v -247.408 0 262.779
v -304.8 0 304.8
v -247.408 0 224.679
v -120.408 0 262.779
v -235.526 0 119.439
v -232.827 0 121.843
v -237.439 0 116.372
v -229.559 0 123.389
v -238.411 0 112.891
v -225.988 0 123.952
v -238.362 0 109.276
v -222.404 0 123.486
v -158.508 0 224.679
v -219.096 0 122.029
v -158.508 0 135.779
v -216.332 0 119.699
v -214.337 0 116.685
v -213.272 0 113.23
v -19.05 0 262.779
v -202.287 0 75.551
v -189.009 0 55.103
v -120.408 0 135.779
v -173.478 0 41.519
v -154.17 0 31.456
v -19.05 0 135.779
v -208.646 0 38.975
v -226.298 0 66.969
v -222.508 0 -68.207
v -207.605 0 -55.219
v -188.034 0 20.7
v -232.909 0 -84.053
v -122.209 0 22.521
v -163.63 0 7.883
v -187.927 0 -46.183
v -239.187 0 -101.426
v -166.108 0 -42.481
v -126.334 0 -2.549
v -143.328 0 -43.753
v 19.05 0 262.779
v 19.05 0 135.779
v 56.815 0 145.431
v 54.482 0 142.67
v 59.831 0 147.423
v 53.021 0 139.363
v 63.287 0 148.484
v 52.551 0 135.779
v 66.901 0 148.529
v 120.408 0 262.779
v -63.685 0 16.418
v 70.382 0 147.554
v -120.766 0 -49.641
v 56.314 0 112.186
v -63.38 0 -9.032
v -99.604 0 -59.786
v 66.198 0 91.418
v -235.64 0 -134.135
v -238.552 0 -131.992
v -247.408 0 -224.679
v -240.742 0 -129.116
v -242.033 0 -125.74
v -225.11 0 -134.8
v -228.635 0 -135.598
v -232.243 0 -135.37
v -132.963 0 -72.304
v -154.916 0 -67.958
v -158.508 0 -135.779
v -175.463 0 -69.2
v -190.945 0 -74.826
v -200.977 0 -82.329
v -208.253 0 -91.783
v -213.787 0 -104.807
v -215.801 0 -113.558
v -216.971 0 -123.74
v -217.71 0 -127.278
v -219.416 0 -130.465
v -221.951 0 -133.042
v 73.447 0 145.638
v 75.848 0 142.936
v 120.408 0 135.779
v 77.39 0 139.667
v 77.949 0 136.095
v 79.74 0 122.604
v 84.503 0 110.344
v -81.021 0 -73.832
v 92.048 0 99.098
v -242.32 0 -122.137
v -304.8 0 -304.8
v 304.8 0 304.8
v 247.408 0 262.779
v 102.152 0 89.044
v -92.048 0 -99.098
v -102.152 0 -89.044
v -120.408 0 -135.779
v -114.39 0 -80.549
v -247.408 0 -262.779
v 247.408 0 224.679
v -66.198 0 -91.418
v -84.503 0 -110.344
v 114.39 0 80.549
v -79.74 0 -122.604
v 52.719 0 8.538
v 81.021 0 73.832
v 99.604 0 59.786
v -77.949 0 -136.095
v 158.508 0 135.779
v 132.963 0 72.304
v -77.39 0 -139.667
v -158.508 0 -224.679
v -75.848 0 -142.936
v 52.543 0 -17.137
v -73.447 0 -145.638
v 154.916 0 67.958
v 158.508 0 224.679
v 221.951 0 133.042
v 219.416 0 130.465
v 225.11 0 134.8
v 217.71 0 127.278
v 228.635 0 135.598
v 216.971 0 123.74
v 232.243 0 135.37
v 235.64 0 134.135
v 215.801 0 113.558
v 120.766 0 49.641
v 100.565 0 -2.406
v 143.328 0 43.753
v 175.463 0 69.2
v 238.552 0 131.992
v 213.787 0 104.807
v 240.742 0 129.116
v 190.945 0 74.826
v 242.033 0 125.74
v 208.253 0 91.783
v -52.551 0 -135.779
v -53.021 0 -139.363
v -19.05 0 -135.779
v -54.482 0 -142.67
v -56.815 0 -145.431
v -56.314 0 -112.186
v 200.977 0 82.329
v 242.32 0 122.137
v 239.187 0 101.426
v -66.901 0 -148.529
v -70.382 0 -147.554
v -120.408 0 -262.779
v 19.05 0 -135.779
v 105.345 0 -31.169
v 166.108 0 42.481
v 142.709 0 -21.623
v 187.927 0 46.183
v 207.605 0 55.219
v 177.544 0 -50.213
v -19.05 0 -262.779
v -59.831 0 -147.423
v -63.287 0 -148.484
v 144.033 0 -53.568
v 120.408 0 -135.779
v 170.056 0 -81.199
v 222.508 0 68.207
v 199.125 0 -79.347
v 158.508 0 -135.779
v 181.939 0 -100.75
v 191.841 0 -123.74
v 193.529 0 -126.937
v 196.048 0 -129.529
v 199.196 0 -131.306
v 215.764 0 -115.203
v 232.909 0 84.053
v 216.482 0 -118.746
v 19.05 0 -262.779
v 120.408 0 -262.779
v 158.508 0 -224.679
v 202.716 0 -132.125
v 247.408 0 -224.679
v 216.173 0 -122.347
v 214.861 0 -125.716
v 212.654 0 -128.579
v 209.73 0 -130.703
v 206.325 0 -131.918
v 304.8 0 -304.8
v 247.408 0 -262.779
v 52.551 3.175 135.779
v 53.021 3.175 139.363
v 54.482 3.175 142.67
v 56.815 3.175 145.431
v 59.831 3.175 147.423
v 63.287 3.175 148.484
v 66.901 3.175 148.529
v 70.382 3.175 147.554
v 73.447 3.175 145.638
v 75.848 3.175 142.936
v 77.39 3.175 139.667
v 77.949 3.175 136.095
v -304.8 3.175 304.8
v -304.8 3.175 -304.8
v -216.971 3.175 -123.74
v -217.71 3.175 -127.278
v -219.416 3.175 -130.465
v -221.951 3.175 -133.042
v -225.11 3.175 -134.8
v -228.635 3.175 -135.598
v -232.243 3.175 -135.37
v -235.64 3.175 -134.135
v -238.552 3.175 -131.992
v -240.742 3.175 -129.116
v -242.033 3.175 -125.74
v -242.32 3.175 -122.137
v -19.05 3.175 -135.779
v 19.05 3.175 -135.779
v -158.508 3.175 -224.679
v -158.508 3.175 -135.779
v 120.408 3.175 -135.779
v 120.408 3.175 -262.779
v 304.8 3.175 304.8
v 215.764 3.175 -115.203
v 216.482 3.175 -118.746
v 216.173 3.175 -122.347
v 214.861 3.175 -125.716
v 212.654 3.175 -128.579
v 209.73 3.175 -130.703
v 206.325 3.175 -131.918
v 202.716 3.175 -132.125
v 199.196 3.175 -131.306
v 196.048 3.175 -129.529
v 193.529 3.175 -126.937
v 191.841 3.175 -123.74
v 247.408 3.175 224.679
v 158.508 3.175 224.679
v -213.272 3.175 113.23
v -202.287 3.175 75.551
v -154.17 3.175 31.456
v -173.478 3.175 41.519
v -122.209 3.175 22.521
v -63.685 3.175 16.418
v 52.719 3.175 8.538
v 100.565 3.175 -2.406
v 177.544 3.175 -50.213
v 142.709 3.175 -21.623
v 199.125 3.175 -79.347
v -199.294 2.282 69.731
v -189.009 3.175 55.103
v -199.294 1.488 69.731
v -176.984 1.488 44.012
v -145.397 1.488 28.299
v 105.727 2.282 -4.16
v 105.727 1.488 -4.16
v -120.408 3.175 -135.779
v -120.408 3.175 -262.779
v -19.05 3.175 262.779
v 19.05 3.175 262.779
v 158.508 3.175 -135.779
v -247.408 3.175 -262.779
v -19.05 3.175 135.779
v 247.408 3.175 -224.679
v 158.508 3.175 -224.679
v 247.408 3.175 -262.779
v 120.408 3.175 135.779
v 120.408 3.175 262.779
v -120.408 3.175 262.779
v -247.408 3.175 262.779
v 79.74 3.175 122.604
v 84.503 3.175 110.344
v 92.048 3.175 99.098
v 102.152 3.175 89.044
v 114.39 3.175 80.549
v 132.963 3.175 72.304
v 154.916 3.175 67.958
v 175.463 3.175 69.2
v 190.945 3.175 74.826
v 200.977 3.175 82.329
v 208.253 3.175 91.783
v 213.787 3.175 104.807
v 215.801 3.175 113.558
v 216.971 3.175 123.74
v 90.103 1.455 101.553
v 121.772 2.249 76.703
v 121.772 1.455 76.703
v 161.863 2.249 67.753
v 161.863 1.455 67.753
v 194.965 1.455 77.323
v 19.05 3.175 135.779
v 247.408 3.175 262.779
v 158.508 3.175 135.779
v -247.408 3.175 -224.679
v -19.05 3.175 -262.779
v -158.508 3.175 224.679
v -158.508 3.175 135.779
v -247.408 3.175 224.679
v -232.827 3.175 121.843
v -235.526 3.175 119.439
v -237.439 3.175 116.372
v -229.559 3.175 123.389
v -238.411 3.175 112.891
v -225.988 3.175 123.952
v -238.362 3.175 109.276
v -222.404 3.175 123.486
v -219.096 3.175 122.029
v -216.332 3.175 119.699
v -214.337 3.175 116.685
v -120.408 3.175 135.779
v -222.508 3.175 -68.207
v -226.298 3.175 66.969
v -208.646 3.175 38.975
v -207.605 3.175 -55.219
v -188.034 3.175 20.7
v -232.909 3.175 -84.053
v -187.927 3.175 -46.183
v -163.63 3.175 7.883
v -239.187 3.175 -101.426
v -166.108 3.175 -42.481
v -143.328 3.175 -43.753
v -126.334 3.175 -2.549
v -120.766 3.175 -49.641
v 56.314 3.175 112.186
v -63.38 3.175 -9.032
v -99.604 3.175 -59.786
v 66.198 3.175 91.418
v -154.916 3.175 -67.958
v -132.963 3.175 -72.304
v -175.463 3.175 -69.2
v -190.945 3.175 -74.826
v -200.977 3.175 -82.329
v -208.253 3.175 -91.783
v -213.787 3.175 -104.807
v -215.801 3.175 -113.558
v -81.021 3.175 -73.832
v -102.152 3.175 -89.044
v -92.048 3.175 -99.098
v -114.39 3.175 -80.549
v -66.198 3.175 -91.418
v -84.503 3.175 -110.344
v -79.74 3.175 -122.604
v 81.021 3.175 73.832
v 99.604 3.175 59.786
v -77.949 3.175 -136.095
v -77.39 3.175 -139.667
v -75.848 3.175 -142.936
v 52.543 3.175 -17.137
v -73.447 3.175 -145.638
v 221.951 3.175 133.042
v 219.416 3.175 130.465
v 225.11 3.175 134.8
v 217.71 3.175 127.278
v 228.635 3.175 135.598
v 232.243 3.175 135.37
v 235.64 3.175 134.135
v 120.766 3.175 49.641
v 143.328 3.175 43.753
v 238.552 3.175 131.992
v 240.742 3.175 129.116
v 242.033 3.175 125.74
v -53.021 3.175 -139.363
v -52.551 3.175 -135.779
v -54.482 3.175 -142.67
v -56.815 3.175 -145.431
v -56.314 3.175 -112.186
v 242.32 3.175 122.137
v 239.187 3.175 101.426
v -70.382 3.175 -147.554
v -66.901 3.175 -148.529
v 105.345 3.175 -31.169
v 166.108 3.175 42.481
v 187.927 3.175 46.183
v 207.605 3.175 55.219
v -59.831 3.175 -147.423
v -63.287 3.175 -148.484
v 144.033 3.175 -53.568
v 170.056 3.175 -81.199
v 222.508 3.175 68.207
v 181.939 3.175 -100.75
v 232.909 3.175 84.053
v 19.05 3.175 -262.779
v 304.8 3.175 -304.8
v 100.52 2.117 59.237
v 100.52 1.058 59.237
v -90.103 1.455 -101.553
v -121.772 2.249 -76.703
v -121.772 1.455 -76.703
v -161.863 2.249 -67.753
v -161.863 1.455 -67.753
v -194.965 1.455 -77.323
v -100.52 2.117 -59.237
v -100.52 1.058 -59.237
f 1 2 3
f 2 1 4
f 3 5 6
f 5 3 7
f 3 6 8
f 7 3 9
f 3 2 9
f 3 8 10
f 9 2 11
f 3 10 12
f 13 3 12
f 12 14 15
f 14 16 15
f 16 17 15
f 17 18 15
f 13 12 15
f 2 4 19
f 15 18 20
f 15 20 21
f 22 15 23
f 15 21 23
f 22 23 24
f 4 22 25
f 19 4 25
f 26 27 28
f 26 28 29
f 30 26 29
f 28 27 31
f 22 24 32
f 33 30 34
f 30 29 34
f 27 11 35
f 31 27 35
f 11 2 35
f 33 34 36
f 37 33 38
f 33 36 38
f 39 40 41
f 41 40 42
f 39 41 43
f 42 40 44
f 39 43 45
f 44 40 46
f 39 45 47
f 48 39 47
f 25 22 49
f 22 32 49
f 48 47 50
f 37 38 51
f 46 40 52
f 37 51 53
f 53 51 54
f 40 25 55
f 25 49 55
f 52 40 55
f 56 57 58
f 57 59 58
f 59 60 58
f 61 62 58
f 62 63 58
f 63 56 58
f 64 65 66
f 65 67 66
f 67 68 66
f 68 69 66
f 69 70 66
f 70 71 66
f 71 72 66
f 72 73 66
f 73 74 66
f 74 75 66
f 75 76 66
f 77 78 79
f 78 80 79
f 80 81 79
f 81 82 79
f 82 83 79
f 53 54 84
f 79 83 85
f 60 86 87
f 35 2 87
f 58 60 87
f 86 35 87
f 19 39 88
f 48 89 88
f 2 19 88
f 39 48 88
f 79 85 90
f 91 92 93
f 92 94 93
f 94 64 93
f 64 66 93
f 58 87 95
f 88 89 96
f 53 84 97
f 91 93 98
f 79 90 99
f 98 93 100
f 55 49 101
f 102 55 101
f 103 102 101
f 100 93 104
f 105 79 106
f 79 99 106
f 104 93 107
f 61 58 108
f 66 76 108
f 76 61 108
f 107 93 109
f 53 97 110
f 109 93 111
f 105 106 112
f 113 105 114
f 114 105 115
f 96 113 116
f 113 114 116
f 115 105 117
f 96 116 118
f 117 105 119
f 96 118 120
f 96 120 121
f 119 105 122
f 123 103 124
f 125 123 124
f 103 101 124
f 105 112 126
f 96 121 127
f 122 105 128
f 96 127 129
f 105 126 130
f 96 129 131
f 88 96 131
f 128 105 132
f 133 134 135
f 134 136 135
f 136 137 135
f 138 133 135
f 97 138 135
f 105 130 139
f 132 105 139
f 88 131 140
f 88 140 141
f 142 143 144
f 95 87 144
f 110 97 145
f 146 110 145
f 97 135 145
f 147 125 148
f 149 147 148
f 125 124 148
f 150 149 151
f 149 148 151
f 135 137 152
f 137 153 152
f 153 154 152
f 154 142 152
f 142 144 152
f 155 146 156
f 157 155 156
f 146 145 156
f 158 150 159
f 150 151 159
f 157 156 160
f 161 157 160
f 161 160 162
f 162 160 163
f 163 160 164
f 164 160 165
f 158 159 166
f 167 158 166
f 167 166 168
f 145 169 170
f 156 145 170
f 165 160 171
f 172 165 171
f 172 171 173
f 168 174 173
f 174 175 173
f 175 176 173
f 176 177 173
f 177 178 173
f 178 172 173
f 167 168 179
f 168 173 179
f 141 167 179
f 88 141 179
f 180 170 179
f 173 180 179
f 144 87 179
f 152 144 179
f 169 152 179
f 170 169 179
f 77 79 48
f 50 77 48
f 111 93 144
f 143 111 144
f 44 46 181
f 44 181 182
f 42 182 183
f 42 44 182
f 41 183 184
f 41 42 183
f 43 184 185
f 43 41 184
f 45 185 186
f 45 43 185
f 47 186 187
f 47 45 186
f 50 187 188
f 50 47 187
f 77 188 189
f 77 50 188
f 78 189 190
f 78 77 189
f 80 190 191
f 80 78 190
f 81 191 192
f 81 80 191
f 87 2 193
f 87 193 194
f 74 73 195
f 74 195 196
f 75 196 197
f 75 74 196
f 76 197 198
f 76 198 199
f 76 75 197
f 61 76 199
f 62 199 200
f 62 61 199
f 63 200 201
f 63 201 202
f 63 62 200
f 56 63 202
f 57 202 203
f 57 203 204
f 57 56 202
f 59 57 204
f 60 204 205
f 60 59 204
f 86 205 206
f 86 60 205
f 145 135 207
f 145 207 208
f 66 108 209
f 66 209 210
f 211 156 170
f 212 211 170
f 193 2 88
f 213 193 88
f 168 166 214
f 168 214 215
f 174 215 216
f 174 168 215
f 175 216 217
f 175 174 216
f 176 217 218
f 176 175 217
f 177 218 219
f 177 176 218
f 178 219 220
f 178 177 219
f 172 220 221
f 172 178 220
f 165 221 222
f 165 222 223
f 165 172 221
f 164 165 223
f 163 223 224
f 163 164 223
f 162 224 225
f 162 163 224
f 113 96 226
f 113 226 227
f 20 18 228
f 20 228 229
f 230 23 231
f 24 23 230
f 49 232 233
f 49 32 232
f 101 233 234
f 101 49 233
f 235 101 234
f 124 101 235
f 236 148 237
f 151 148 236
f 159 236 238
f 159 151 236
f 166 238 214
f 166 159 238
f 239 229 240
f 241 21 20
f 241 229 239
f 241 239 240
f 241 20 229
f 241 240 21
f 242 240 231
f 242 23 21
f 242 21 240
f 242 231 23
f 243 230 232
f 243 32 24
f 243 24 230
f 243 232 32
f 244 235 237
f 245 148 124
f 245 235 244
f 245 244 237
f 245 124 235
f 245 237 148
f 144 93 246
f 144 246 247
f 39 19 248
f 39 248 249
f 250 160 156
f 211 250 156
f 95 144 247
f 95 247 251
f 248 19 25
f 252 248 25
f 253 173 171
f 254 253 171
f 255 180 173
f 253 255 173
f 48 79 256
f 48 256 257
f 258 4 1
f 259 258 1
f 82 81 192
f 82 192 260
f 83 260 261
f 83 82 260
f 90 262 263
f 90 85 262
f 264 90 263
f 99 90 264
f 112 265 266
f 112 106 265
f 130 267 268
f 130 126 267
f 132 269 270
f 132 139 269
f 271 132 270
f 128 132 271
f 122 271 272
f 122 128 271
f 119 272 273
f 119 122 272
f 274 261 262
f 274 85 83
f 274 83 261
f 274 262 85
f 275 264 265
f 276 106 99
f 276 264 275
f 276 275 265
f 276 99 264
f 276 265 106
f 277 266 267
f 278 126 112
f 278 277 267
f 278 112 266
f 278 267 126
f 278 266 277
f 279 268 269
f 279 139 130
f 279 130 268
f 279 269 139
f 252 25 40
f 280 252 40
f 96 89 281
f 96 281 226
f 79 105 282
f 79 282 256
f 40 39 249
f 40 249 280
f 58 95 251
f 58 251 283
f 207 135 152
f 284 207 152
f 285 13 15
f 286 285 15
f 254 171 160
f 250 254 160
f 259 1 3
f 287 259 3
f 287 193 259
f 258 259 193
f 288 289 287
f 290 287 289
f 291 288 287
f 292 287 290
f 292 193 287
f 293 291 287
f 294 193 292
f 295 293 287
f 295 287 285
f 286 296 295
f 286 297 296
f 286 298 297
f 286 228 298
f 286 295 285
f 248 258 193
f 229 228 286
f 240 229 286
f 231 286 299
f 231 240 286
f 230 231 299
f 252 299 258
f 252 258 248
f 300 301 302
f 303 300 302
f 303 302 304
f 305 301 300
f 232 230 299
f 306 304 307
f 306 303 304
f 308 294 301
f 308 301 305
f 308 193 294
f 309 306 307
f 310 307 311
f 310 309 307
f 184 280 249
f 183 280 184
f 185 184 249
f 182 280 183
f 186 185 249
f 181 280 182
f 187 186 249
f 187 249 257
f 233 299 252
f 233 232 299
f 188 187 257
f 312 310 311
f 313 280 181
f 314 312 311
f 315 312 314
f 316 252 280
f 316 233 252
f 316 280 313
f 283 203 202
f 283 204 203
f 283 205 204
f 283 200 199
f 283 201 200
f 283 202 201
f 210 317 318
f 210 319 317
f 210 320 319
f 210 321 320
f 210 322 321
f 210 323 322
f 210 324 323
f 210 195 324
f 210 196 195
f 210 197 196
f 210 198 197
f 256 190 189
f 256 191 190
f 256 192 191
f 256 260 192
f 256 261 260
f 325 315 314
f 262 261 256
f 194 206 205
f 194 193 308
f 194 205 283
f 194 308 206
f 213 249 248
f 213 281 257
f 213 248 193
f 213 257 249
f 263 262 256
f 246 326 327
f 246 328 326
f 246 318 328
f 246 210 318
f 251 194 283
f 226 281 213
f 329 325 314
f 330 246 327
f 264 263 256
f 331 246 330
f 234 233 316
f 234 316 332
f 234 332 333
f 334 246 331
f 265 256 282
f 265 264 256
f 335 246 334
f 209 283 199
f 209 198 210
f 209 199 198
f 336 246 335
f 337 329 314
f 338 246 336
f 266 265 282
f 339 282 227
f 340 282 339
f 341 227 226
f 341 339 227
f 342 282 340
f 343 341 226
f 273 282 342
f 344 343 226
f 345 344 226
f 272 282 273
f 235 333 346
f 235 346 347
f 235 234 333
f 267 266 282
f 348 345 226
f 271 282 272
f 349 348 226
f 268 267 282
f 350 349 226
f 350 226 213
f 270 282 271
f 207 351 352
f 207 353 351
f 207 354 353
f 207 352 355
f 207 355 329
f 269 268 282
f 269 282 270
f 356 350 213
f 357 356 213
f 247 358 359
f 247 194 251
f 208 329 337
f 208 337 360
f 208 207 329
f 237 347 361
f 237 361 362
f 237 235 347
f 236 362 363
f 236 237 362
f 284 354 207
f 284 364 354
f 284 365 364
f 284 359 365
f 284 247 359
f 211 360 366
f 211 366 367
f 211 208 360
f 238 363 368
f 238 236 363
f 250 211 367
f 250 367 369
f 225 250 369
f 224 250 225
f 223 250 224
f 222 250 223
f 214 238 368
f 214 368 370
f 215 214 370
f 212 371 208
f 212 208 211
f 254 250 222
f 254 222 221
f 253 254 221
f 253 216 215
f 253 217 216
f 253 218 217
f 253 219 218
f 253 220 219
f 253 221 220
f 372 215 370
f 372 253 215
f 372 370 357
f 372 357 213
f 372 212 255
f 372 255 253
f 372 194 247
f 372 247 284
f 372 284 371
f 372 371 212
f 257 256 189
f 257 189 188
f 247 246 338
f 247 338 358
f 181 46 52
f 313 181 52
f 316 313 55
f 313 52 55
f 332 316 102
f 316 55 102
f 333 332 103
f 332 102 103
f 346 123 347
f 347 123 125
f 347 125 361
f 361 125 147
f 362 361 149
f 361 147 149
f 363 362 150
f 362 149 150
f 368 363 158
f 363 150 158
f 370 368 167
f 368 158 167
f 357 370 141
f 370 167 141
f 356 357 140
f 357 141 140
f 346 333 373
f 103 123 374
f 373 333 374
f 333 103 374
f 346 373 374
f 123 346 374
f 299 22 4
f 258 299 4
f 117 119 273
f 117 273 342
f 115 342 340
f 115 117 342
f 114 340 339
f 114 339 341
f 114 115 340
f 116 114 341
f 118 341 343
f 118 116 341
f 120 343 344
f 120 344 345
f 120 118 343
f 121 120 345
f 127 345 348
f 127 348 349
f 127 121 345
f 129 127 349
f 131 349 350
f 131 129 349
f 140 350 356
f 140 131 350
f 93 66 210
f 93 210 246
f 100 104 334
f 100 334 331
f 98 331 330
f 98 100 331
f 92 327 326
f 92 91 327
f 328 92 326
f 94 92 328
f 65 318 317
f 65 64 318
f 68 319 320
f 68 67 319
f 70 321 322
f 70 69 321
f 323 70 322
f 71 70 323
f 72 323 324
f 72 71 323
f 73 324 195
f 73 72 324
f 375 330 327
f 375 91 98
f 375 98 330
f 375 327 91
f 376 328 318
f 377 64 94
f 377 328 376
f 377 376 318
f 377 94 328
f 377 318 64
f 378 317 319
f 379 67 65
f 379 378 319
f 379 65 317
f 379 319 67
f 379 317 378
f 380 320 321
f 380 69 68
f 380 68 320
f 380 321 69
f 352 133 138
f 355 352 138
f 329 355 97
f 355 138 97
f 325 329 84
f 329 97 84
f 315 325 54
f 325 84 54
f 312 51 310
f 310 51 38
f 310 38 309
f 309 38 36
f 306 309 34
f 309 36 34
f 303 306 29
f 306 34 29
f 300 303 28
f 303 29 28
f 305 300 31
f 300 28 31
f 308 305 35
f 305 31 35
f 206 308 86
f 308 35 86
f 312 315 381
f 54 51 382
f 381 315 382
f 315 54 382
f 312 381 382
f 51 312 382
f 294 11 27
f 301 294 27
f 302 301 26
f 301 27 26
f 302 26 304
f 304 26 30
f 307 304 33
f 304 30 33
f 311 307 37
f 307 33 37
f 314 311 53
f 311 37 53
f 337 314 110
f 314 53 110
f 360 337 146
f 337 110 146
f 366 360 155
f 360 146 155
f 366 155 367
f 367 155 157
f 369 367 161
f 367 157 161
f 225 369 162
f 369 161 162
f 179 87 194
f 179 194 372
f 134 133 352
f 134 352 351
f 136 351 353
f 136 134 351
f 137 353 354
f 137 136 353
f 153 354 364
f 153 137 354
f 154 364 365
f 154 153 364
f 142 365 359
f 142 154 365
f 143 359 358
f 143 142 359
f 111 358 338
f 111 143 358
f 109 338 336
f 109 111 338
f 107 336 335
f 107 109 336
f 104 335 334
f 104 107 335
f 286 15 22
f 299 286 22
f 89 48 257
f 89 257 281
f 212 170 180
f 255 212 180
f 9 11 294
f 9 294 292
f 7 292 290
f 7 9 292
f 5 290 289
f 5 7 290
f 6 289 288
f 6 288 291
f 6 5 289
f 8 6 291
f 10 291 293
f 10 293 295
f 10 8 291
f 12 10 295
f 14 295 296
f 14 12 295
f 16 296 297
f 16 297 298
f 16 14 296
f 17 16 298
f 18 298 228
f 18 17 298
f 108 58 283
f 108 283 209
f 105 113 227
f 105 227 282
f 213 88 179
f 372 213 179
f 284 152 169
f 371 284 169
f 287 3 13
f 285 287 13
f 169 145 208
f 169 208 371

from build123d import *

# Parameters (mm, degrees)
SKETCH1_W           = 609.6
SKETCH1_H           = 609.6
SKETCH1_W_2         = 38.1
SKETCH1_H_2         = 127
BOSS_EXTRUDE1_DEPTH = 3.175


with BuildPart() as part:
    # Sketch1 → Boss-Extrude1 (new body)
    with BuildSketch(Plane(origin=(0, 0, 0), x_dir=(1, 0, 0), z_dir=(0, 1, 0))):
        Rectangle(SKETCH1_W, SKETCH1_H)
        Polygon((120.408154002, 135.779180095), (120.408154002, 262.779180095), (247.408154002, 262.779180095), (247.408154002, 224.679180095), (158.508154002, 224.679180095), (158.508154002, 135.779180095), align=None, mode=Mode.SUBTRACT)
        with Locations((0, 199.279180095)):
            Rectangle(SKETCH1_W_2, SKETCH1_H_2, mode=Mode.SUBTRACT)
        Polygon((-158.508154002, 224.679180095), (-158.508154002, 135.779180095), (-120.408154002, 135.779180095), (-120.408154002, 262.779180095), (-247.408154002, 262.779180095), (-247.408154002, 224.679180095), align=None, mode=Mode.SUBTRACT)
        Polygon((158.508154002, -224.679180095), (158.508154002, -135.779180095), (120.408154002, -135.779180095), (120.408154002, -262.779180095), (247.408154002, -262.779180095), (247.408154002, -224.679180095), align=None, mode=Mode.SUBTRACT)
        with Locations((0, -199.279180095)):
            Rectangle(SKETCH1_W_2, SKETCH1_H_2, mode=Mode.SUBTRACT)
        Polygon((-247.408154002, -224.679180095), (-158.508154002, -224.679180095), (-158.508154002, -135.779180095), (-120.408154002, -135.779180095), (-120.408154002, -262.779180095), (-247.408154002, -262.779180095), align=None, mode=Mode.SUBTRACT)
        with BuildLine():
            ThreePointArc((52.551332081, -135.779180095), (65.092340177, -148.636206032), (77.949366114, -136.095197937))
            add(Edge.make_bspline(
                [(77.949366114, -136.095197937), (77.962871775, -135.00976167), (78.051522279, -132.819994322), (78.461018982, -128.610747096), (79.391750695, -123.529893605), (81.140586923, -117.702146239), (84.288273438, -110.22828937), (89.724874356, -101.398698485), (98.52001314, -91.730852125), (109.296478393, -83.291620152), (125.7100411, -74.097744104), (144.107538407, -68.589807628), (162.008327299, -67.396780618), (174.562605493, -68.637977939), (185.730202076, -71.902172234), (195.230771881, -77.014054641), (201.820897642, -82.819870924), (206.398964756, -88.654208165), (209.481301131, -93.743351916), (212.177363153, -99.667795966), (214.042508359, -105.400408521), (215.255816836, -110.514072692), (216.01193439, -114.620965061), (216.502025281, -118.283361589), (216.801657973, -121.346084505), (216.920978677, -122.947020667), (216.971104363, -123.739711144)],
                knots=[0, 0, 0, 0, 0.015625, 0.03125, 0.0625, 0.09375, 0.125, 0.1875, 0.25, 0.3125, 0.375, 0.5, 0.5625, 0.625, 0.6875, 0.75, 0.8125, 0.84375, 0.875, 0.90625, 0.9375, 0.953125, 0.96875, 0.984375, 0.9921875, 1, 1, 1, 1], degree=3))
            ThreePointArc((216.971104363, -123.739711144), (230.447270979, -135.612913465), (242.3204733, -122.136746849))
            add(Edge.make_bspline(
                [(52.551332081, -135.779180095), (53.803993226, -35.104071896), (234.278707736, 5.036193149), (242.3204733, -122.136746849)],
                knots=[0, 0, 0, 0, 1, 1, 1, 1], degree=3))
        make_face(mode=Mode.SUBTRACT)
        with BuildLine():
            ThreePointArc((-52.551332081, 135.779180095), (-65.092340177, 148.636206032), (-77.949366114, 136.095197937))
            add(Edge.make_bspline(
                [(-77.949366114, 136.095197937), (-77.962871775, 135.00976167), (-78.051522279, 132.819994322), (-78.461018982, 128.610747096), (-79.391750695, 123.529893605), (-81.140586923, 117.702146239), (-84.288273438, 110.22828937), (-89.724874356, 101.398698485), (-98.52001314, 91.730852125), (-109.296478393, 83.291620152), (-125.7100411, 74.097744104), (-144.107538407, 68.589807628), (-162.008327299, 67.396780618), (-174.562605493, 68.637977939), (-185.730202076, 71.902172234), (-195.230771881, 77.014054641), (-201.820897642, 82.819870924), (-206.398964756, 88.654208165), (-209.481301131, 93.743351916), (-212.177363153, 99.667795966), (-214.042508359, 105.400408521), (-215.255816836, 110.514072692), (-216.01193439, 114.620965061), (-216.502025281, 118.283361589), (-216.801657973, 121.346084505), (-216.920978677, 122.947020667), (-216.971104363, 123.739711144)],
                knots=[0, 0, 0, 0, 0.015625, 0.03125, 0.0625, 0.09375, 0.125, 0.1875, 0.25, 0.3125, 0.375, 0.5, 0.5625, 0.625, 0.6875, 0.75, 0.8125, 0.84375, 0.875, 0.90625, 0.9375, 0.953125, 0.96875, 0.984375, 0.9921875, 1, 1, 1, 1], degree=3))
            ThreePointArc((-216.971104363, 123.739711144), (-230.447270979, 135.612913465), (-242.3204733, 122.136746849))
            add(Edge.make_bspline(
                [(-52.551332081, 135.779180095), (-53.803993226, 35.104071896), (-234.278707736, -5.036193149), (-242.3204733, 122.136746849)],
                knots=[0, 0, 0, 0, 1, 1, 1, 1], degree=3))
        make_face(mode=Mode.SUBTRACT)
        with BuildLine():
            ThreePointArc((-238.361805519, -109.276089344), (-227.793814923, -123.798402341), (-213.271501927, -113.230411744))
            add(Edge.make_bspline(
                [(-213.271501927, -113.230411744), (-213.151711371, -112.470336791), (-212.901399378, -110.942133808), (-212.376470719, -107.967853935), (-211.667401285, -104.350251745), (-210.737688056, -100.183113029), (-209.396326232, -94.848652891), (-207.537338772, -88.590365879), (-205.039618896, -81.703545889), (-202.297676371, -75.403179873), (-198.340291718, -67.72877181), (-192.86473475, -59.383344605), (-185.469393079, -50.978746481), (-177.159554076, -43.839947193), (-167.799053029, -37.731600761), (-153.784222926, -30.792133533), (-133.28509315, -24.22852654), (-104.453100091, -19.330230382), (-72.38586379, -16.682179087), (-38.055823436, -15.267140213), (-2.333026847, -13.913947785), (34.024700143, -11.346923243), (70.348040016, -6.174035434), (105.983184152, 3.16701171), (134.39986785, 15.91619513), (155.642723734, 29.956085882), (170.580590208, 42.556344707), (184.278786849, 57.320430485), (194.478117069, 71.453337622), (201.830548984, 83.861665804), (206.927792683, 93.718040184), (210.822379773, 102.401329596), (213.7158707, 109.613690679), (215.099625409, 113.341406131), (215.763927247, 115.202976942)],
                knots=[0, 0, 0, 0, 0.00390625, 0.0078125, 0.015625, 0.0234375, 0.03125, 0.046875, 0.0625, 0.078125, 0.09375, 0.125, 0.15625, 0.1875, 0.21875, 0.25, 0.3125, 0.375, 0.4375, 0.5, 0.5625, 0.625, 0.6875, 0.75, 0.8125, 0.84375, 0.875, 0.90625, 0.9375, 0.953125, 0.96875, 0.984375, 0.9921875, 1, 1, 1, 1], degree=3))
            ThreePointArc((215.763927247, 115.202976942), (208.071063547, 131.432574845), (191.841465644, 123.739711144))
            add(Edge.make_bspline(
                [(-238.361805519, -109.276089344), (-231.837247772, -67.877559295), (-143.94762142, 74.845593782), (129.599293897, -50.681317832), (191.841465644, 123.739711144)],
                knots=[0, 0, 0, 0, 0.18643952, 1, 1, 1, 1], degree=3))
        make_face(mode=Mode.SUBTRACT)
    extrude(amount=BOSS_EXTRUDE1_DEPTH)


solid = part.part
